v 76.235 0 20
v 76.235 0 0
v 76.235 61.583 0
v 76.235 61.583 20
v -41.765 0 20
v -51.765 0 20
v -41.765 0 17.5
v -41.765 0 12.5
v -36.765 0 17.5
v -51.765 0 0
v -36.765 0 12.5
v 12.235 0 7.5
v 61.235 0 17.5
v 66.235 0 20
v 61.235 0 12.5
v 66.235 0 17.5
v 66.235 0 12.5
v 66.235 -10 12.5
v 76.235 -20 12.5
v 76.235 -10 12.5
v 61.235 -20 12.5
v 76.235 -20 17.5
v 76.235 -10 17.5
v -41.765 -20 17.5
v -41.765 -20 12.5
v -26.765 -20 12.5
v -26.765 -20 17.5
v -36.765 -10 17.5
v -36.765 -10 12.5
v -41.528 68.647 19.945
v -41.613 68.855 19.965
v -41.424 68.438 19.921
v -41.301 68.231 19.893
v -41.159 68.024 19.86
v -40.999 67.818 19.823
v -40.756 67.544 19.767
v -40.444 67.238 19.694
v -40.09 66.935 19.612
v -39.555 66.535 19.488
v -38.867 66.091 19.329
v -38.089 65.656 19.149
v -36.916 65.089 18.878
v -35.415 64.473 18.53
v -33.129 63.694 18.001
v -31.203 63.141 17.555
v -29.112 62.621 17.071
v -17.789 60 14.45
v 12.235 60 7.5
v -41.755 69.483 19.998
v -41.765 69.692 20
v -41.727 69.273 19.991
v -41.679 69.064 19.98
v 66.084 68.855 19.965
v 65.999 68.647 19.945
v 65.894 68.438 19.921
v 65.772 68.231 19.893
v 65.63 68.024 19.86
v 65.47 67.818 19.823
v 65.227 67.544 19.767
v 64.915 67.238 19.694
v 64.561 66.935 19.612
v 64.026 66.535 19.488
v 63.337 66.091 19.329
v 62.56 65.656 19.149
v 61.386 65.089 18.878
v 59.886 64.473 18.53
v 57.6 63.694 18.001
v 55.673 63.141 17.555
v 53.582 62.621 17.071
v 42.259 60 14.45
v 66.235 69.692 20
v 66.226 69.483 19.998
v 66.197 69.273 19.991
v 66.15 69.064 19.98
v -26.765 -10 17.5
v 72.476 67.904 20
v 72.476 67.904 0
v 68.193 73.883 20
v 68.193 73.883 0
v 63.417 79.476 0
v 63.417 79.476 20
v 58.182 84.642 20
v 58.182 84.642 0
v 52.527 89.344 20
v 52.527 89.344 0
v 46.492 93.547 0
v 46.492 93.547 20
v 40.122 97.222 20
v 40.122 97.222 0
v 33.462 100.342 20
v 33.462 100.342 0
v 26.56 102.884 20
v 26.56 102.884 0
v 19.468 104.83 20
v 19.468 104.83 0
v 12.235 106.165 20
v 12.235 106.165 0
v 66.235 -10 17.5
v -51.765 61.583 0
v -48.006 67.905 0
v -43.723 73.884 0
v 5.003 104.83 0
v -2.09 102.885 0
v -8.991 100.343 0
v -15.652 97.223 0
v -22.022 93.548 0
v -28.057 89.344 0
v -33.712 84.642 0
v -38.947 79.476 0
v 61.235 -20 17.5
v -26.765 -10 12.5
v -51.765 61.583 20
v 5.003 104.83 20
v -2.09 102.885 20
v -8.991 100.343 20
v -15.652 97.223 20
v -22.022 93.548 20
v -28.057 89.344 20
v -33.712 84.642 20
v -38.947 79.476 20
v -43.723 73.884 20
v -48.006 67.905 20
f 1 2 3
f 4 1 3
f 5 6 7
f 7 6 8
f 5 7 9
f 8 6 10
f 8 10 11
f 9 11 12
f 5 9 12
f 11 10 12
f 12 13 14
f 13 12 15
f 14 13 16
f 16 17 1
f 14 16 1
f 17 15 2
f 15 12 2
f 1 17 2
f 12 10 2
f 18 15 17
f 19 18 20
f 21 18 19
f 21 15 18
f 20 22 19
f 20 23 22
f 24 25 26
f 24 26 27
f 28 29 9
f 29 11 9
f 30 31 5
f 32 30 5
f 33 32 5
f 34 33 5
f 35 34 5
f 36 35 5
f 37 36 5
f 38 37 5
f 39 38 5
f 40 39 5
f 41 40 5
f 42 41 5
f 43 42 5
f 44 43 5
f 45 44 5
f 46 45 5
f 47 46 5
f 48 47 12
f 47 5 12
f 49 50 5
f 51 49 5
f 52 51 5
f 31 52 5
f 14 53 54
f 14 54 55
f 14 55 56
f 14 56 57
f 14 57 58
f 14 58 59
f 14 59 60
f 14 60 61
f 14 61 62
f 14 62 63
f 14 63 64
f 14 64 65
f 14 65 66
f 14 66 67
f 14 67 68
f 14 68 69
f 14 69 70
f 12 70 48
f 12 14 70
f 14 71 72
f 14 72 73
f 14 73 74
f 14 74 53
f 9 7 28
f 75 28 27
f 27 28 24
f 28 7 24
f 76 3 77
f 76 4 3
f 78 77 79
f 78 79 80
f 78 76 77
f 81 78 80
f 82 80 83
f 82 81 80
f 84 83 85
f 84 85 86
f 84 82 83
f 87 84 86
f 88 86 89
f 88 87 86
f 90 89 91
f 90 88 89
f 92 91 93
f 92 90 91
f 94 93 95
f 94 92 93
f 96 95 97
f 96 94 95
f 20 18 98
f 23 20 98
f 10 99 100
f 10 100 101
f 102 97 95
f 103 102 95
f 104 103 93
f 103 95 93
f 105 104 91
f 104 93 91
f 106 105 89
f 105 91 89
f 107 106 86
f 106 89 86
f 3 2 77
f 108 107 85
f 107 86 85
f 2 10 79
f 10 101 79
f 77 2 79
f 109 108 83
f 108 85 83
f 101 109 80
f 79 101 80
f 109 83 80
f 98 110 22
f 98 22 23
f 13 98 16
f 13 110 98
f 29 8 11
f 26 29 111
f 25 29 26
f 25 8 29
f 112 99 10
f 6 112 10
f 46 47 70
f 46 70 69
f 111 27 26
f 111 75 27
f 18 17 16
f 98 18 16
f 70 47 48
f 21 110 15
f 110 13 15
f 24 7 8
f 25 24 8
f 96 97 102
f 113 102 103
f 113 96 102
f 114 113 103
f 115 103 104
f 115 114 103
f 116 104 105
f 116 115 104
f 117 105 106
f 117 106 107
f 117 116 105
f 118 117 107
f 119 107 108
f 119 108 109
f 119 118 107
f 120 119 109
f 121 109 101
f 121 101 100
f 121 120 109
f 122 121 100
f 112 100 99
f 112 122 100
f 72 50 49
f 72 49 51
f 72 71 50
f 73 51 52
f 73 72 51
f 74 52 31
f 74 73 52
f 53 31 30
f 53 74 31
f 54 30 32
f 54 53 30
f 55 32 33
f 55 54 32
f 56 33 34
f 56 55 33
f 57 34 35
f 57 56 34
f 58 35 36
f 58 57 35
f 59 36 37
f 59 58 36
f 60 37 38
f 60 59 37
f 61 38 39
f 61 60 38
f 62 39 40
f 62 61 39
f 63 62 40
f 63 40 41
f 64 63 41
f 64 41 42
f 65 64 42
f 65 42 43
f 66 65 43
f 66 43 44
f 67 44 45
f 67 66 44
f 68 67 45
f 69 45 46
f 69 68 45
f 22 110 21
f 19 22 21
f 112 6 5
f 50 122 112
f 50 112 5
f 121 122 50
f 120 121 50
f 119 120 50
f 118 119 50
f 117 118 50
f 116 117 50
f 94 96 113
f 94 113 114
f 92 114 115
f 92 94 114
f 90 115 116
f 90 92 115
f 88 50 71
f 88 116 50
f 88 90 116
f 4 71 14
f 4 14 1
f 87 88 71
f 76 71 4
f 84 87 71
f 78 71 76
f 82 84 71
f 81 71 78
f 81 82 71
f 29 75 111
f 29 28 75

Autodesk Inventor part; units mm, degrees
ref_plane "YZ Plane" through (0, 0, 0) normal (1, 0, 0) x (0, 1, 0)
ref_plane "XZ Plane" through (0, 0, 0) normal (0, 1, 0) x (-1, 0, 0)
ref_plane "XY Plane" through (0, 0, 0) normal (0, 0, 1) x (1, 0, 0)
sketch "Esquisse1" plane through (0, 0, 0) normal (0, 0, 1) x (1, 0, 0)
  line L0 (-51.7647, 0) -> (76.2353, 0)
  line L1 (76.2353, 0) -> (76.2353, 106.1647)
  line L2 (76.2353, 106.1647) -> (-51.7647, 106.1647)
  line L3 (-51.7647, 106.1647) -> (-51.7647, 0)
  point P0 (0, 0)
  dimension "d0" = 128
extrude "Extrusion1" add sketch "Esquisse1" along normal blind 20
sketch "Esquisse2" plane through (0, 0, 20) normal (0, 0, 1) x (1, 0, 0)
  line L0 (-51.7647, 106.1647) -> (-51.7647, 0) projected
  line L1 (-51.7647, 61.583) -> (76.7863, 61.583)
  line L2 (76.2353, 106.1647) -> (-51.7647, 106.1647) projected
  arc A0 (76.2353, 61.583) -> (12.2353, 106.1647) centre (0.1874, 20.6401) ccw
  line L3 (-51.7647, 106.1647) -> (-51.7647, 61.583)
  line L4 (-51.7647, 106.1647) -> (76.2353, 106.1647)
  line L5 (76.2353, 0) -> (76.2353, 106.1647) projected
  line L6 (76.2353, 106.1647) -> (76.2353, 61.583)
  arc A1 (12.2353, 106.1647) -> (-51.7647, 61.583) centre (24.2774, 20.6484) ccw
  line L7 (-51.7647, 61.583) -> (-51.7647, 106.1647)
  line L8 (-51.7647, 106.1647) -> (76.2353, 106.1647)
  line L9 (76.2353, 106.1647) -> (76.2353, 61.583)
  point P0 (0, 0)
  dimension "d5" = 86.36
extrude "Extrusion2" cut sketch "Esquisse2" against normal blind 20 contours L2 A1 L0 | L2 L5 A0
sketch "Esquisse3" plane through (-51.7647, 0, 0) normal (0, -1, 0) x (1, 0, 0)
  line L0 (0, 20) -> (128, 20) projected
  line L1 (10, 20) -> (118, 20)
  line L2 (118, 20) -> (118, 7.5)
  line L3 (118, 7.5) -> (10, 7.5)
  line L4 (10, 7.5) -> (10, 20)
  line L5 (0, 0) -> (0, 20) projected
  line L6 (128, 0) -> (128, 20) projected
  line L7 (0, 0) -> (128, 0) projected
  line L8 (10, 20) -> (64, 7.5)
  line L9 (118, 20) -> (64, 7.5)
  line L10 (118, 20) -> (10, 20)
  point P0 (51.7647, 0)
  dimension "d6" = 10
  dimension "d7" = 10
  dimension "d8" = 7.5
extrude "Extrusion3" cut sketch "Esquisse3" against normal blind 60 contours L0 L9 L8
chamfer "Chanfrein1" distance 5.55 angle 45 1 edges at (12.2353, 60, 20)
fillet "Congé1" radius 10 1 edges at (12.2353, 65.55, 20)
sketch "Esquisse4" plane through (-51.7647, 0, 0) normal (0, -1, 0) x (1, 0, 0)
  line L0 (10, 12.5) -> (15, 12.5)
  line L1 (15, 12.5) -> (15, 17.5)
  line L2 (15, 17.5) -> (10, 17.5)
  line L3 (10, 17.5) -> (10, 12.5)
  line L4 (0, 20) -> (10, 20) projected
  line L5 (0, 0) -> (0, 20) projected
  point P0 (51.7647, 0)
  point P1 (5, 20)
  dimension "d15" = 5
  dimension "d16" = 5
  dimension "d17" = 2.5
  dimension "d18" = 10
extrude "Extrusion4" add sketch "Esquisse4" along normal blind 20
sketch "Esquisse5" plane through (-36.7647, 0, 17.5) normal (1, 0, 0) x (0, 0, -1)
  point P0 (17.5, 0)
sketch "Esquisse6" plane through (-36.7647, 0, 17.5) normal (1, 0, 0) x (0, 0, -1)
  line L0 (5, 0) -> (5, -20) projected
  line L1 (0, 0) -> (0, -20) projected
  line L2 (5, -20) -> (0, -20)
  line L3 (0, -20) -> (0, -10)
  line L4 (0, -10) -> (5, -10)
  line L5 (5, -10) -> (5, -20)
  point P0 (17.5, 0)
extrude "Extrusion5" add sketch "Esquisse6" along normal blind 10
sketch "Esquisse7" plane through (-51.7647, 0, 0) normal (0, -1, 0) x (1, 0, 0)
  line L0 (118, 17.5) -> (113, 17.5)
  line L1 (113, 17.5) -> (113, 12.5)
  line L2 (113, 12.5) -> (118, 12.5)
  line L3 (118, 12.5) -> (118, 17.5)
  line L4 (128, 0) -> (128, 20) projected
  line L5 (118, 20) -> (128, 20) projected
  point P0 (51.7647, 0)
  dimension "d23" = 5
  dimension "d24" = 5
  dimension "d25" = 10
  dimension "d26" = 2.5
extrude "Extrusion6" add sketch "Esquisse7" along normal blind 20
sketch "Esquisse8" plane through (66.2353, 0, 17.5) normal (1, 0, 0) x (0, 0, -1)
  line L0 (0, -20) -> (5, -20) projected
  line L1 (5, -10) -> (0, -10) projected
  line L2 (5, -20) -> (0, -20)
  line L3 (0, -20) -> (0, -10)
  line L4 (0, -10) -> (5, -10)
  line L5 (5, -10) -> (5, -20)
  point P0 (17.5, 0)
extrude "Extrusion7" add sketch "Esquisse8" along normal blind 10
properties part number "coupole"
